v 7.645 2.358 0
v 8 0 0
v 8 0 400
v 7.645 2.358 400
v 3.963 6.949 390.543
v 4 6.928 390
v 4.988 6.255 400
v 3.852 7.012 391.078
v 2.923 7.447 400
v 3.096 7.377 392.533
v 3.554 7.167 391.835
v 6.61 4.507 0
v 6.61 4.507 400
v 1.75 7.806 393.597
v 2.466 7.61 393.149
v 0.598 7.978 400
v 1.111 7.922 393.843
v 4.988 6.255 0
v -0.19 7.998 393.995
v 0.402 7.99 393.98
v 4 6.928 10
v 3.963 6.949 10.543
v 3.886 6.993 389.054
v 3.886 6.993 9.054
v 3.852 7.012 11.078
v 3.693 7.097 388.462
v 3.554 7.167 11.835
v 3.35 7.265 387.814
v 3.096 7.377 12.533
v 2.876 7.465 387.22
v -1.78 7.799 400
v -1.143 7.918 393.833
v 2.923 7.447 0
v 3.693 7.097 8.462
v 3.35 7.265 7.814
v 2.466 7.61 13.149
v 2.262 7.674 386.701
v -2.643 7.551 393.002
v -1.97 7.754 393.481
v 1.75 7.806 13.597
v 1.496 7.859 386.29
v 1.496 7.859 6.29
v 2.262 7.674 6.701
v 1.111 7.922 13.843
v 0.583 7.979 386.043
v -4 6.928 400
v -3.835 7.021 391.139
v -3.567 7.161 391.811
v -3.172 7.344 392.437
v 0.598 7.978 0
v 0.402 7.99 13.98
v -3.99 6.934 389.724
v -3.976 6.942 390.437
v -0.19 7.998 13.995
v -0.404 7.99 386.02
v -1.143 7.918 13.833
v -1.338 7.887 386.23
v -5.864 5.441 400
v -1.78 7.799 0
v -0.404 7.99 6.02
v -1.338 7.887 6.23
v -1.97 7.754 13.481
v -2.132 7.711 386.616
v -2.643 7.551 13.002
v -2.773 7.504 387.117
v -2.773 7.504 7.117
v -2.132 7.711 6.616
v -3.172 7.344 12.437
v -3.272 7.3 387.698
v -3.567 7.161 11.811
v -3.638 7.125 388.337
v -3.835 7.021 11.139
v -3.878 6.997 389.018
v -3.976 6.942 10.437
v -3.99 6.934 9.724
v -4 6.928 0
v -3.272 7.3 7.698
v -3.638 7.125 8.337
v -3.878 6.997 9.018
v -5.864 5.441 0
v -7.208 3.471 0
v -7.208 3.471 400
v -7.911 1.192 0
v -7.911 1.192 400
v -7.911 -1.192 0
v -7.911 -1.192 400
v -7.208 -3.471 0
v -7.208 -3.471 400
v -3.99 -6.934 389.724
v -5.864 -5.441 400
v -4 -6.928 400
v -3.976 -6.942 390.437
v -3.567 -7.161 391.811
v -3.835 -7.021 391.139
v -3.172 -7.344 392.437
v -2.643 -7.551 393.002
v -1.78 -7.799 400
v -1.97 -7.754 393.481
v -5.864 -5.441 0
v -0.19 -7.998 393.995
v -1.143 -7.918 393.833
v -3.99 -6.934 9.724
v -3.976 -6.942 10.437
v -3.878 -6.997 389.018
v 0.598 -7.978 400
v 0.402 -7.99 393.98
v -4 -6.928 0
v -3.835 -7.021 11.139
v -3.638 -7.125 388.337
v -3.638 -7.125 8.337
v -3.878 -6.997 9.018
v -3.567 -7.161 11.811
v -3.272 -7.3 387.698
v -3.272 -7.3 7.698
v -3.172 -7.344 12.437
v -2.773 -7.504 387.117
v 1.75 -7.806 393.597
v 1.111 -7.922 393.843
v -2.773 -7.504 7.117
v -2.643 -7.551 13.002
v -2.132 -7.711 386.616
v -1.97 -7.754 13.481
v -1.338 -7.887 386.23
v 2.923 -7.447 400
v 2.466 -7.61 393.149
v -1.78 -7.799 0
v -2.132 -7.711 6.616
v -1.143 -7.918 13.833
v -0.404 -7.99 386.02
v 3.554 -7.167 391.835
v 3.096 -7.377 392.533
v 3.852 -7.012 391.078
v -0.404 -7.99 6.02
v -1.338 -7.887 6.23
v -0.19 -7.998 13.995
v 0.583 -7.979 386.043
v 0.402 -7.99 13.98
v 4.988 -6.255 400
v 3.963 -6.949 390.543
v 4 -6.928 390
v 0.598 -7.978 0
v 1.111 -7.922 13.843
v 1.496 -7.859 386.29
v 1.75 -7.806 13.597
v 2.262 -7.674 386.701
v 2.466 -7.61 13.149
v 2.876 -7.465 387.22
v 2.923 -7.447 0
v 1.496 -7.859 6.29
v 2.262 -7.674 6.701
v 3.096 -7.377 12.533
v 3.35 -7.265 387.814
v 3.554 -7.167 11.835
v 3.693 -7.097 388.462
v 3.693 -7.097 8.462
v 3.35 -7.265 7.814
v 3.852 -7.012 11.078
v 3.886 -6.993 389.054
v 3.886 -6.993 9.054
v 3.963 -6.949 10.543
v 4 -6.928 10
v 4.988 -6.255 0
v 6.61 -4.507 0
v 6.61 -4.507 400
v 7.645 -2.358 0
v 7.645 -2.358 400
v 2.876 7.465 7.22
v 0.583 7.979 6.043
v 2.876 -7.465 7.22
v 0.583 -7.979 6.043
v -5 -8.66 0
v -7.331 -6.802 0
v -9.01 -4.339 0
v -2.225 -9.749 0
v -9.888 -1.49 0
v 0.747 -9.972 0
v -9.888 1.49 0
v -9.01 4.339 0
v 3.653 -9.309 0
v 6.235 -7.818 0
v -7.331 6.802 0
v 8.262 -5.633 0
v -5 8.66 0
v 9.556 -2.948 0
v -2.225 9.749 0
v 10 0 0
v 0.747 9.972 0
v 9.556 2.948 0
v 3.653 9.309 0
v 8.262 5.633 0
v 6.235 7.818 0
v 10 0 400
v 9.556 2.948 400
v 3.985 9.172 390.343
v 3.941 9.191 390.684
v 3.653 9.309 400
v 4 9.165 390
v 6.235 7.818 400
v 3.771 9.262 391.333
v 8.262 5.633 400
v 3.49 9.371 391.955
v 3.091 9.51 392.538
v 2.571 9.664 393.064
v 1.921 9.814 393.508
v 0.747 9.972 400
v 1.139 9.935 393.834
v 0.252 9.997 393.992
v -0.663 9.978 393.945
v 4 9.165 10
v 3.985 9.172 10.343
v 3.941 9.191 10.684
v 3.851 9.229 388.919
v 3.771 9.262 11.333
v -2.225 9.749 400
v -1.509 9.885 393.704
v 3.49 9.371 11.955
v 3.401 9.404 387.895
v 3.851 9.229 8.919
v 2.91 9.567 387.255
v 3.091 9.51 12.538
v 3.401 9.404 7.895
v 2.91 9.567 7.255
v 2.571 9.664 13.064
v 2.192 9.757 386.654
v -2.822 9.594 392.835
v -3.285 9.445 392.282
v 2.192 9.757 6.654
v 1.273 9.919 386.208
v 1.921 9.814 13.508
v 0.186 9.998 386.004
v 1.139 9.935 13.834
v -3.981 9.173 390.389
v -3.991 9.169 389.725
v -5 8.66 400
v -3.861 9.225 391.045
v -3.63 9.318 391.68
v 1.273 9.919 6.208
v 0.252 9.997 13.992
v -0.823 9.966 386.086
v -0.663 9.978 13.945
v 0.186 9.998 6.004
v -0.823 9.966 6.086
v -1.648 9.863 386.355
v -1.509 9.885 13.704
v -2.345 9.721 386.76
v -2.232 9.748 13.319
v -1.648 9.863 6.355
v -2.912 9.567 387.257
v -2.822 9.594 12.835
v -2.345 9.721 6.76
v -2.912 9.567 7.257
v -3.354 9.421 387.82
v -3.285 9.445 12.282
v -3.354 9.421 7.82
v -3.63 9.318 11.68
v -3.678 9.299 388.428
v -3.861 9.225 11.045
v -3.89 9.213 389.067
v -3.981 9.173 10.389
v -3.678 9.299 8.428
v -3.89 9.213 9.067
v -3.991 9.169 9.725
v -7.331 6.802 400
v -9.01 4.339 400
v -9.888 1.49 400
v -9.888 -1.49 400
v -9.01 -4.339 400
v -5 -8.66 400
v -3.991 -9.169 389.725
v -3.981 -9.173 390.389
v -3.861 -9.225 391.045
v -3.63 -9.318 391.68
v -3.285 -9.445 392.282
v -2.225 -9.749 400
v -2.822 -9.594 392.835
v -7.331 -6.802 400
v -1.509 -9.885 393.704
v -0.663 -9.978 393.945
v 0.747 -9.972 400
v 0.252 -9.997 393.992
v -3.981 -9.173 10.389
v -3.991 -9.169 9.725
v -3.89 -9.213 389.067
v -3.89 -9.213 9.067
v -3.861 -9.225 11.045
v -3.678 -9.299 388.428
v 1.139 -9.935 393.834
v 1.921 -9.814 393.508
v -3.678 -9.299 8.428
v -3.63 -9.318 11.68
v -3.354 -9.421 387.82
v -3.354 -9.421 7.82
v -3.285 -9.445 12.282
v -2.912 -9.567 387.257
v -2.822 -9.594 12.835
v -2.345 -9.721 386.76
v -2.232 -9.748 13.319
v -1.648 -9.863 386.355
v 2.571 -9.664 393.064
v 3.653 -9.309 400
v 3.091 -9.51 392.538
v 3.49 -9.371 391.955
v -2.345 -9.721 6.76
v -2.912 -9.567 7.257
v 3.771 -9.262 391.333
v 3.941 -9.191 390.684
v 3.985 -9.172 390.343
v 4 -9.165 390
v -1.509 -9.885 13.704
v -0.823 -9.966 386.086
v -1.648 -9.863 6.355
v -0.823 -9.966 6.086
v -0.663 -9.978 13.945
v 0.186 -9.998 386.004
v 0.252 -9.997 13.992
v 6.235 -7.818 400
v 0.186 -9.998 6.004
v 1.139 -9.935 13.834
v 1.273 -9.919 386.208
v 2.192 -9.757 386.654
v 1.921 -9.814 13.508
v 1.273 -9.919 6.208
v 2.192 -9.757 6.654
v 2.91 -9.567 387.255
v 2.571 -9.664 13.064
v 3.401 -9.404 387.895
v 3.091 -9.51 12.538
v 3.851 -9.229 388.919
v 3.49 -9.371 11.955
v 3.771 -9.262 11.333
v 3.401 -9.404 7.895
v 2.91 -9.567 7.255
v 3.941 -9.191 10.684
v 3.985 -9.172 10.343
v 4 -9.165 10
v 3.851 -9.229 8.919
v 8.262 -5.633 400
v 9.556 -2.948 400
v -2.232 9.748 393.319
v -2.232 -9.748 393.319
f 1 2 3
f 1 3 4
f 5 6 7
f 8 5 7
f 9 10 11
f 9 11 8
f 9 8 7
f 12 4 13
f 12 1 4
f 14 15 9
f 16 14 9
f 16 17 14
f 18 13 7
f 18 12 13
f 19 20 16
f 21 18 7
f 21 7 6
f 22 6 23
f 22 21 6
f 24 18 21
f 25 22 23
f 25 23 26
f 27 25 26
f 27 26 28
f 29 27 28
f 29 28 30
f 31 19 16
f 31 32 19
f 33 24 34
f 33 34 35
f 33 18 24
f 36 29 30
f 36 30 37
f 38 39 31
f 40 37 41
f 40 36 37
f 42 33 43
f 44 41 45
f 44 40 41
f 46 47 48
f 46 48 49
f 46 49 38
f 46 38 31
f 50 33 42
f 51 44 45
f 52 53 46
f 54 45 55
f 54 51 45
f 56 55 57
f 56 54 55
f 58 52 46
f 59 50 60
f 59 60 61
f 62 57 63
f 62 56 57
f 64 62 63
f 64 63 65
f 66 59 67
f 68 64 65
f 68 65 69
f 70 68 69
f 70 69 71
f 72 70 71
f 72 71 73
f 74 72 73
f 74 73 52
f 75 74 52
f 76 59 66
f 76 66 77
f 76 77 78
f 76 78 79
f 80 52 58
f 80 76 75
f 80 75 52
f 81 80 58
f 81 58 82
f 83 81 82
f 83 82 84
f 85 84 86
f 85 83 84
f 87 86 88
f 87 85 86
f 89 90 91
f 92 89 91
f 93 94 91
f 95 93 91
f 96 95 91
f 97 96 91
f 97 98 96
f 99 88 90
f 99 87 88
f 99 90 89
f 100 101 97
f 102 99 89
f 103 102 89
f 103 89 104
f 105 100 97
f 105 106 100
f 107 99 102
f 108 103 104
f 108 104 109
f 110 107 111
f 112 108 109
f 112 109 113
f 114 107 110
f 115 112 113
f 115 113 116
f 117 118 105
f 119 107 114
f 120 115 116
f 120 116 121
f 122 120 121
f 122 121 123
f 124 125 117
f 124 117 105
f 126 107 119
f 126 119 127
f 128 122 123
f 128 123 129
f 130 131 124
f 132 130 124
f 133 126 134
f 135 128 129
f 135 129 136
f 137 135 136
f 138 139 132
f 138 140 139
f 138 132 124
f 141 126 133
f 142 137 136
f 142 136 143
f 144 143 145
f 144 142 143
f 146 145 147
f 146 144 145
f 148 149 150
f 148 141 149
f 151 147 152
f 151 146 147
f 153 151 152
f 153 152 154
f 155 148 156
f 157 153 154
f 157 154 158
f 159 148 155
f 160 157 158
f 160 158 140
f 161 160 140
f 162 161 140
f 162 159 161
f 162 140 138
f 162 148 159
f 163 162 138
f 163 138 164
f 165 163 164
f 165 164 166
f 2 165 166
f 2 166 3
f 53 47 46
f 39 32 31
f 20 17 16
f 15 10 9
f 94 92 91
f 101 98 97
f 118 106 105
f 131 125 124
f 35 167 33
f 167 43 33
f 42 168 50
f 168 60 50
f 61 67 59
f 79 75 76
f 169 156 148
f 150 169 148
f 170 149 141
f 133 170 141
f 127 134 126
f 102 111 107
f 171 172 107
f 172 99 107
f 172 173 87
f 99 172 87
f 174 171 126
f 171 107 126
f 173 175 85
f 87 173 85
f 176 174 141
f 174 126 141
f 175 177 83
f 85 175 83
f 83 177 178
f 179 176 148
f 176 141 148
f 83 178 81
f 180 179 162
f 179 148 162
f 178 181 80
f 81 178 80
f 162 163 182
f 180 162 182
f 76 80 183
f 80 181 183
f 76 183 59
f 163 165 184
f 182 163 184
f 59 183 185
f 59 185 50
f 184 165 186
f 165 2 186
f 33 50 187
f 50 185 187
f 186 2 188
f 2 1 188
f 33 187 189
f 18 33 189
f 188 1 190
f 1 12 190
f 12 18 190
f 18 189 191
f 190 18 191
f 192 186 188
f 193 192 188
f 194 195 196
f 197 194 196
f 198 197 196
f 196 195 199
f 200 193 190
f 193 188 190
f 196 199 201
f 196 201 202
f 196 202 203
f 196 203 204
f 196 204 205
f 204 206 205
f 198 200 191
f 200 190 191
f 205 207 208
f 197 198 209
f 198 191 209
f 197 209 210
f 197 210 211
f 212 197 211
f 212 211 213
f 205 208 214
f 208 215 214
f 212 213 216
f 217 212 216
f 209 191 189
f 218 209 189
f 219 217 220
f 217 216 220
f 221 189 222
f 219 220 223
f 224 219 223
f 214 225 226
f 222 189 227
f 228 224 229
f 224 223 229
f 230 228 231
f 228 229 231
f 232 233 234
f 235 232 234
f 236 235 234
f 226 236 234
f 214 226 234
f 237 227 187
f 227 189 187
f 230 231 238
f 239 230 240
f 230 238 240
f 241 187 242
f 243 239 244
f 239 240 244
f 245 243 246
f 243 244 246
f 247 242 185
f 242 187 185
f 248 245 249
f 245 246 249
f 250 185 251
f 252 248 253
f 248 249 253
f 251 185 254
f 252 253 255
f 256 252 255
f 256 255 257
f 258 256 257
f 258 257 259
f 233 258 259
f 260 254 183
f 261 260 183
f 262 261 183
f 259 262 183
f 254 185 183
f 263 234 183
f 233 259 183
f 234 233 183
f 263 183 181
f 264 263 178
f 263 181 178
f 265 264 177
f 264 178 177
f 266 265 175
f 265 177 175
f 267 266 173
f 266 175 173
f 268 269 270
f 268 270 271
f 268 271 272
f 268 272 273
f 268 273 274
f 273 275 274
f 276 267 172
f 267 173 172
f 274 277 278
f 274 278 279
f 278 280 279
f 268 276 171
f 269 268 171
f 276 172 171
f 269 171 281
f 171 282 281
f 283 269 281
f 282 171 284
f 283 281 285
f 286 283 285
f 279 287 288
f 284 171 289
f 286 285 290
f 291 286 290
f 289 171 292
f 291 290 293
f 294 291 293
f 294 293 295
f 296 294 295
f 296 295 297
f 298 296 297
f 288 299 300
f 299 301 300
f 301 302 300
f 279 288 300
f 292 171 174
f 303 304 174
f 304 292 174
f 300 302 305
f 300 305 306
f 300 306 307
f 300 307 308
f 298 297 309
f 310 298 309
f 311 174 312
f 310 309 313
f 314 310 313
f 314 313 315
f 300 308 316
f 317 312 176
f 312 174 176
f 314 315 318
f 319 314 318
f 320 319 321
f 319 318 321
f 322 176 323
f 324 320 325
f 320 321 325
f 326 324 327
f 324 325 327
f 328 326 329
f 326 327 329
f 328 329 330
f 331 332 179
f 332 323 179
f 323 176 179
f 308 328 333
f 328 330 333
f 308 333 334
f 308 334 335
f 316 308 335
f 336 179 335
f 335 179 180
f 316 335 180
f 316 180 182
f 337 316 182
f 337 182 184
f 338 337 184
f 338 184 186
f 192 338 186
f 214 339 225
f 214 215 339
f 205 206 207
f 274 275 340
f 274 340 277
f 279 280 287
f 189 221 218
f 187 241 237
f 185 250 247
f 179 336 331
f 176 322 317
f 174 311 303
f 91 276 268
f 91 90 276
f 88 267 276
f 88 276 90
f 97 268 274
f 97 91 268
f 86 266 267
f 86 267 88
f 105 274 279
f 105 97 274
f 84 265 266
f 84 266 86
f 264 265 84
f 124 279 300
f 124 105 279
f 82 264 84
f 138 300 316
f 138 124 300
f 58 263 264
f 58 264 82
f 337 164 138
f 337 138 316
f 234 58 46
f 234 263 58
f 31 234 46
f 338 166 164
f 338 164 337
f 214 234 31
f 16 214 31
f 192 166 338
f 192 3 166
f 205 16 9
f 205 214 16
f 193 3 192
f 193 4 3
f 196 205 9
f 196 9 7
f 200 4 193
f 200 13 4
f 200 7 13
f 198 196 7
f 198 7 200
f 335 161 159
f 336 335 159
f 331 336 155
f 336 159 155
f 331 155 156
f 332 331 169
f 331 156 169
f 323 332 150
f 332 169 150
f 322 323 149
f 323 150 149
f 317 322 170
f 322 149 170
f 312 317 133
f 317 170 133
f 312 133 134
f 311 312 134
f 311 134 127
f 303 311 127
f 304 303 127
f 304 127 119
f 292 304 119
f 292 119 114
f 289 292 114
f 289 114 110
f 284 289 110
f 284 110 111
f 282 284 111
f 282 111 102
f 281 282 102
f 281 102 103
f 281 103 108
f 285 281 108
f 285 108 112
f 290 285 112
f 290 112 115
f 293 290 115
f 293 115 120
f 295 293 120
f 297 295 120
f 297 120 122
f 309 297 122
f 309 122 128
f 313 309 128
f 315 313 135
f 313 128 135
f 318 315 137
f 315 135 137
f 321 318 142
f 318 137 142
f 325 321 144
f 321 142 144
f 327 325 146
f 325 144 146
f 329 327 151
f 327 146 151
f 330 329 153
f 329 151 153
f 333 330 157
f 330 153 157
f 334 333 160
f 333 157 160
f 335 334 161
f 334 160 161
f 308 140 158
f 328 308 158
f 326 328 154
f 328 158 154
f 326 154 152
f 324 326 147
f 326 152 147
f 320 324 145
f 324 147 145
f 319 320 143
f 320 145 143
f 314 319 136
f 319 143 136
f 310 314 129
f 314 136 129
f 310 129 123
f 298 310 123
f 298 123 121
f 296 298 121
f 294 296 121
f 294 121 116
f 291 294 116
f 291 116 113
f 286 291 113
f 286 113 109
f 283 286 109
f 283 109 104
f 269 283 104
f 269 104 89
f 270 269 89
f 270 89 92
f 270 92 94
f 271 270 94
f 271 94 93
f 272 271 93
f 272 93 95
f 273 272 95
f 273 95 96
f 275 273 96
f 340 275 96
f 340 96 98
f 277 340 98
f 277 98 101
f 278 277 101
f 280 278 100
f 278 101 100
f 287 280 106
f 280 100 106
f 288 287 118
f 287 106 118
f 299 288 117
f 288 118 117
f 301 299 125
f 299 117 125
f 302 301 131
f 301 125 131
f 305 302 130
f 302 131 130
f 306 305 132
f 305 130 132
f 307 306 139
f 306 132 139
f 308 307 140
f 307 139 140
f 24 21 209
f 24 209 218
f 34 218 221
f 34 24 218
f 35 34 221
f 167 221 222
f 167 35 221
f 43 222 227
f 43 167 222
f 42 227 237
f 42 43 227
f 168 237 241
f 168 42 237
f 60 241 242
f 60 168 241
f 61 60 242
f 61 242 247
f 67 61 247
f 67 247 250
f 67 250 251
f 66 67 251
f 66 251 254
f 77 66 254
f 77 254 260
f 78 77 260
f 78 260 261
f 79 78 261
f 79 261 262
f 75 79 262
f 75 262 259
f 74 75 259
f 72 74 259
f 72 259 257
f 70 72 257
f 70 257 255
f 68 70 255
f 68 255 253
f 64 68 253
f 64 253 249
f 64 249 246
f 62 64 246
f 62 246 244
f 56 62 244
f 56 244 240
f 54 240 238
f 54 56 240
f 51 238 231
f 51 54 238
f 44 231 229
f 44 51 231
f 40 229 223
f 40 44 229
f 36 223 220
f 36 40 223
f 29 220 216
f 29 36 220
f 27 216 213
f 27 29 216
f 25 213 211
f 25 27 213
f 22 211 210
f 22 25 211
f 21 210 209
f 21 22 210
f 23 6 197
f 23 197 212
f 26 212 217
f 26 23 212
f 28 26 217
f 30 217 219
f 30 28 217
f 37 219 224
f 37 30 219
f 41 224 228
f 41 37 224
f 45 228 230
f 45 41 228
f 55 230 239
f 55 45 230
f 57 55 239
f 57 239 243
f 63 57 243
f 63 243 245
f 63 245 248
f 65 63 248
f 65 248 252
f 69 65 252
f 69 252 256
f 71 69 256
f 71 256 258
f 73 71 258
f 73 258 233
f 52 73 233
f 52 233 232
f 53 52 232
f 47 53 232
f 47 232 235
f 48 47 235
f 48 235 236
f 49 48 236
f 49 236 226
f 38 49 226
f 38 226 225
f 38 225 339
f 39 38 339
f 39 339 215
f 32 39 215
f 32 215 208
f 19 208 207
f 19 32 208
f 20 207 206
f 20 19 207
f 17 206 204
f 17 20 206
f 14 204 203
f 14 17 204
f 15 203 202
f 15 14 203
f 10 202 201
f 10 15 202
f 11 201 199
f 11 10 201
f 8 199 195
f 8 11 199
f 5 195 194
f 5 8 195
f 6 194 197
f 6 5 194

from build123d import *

# Parameters (mm, degrees)
SKETCH_1_R               = 10
SKETCH_1_R_2             = 8
EXTRUDE_1_DEPTH          = 400
SKETCH_2_R               = 4
CUT_EXTRUDE_1_DEPTH      = 11
CUT_EXTRUDE_1_DEPTH_BACK = 11


with BuildPart() as part:
    # 草图1 → 凸台-拉伸1 (new body)
    with BuildSketch(Plane.XY):
        Circle(SKETCH_1_R)
        Circle(SKETCH_1_R_2, mode=Mode.SUBTRACT)
    extrude(amount=EXTRUDE_1_DEPTH)

    # 草图2 → 切除-拉伸1 (cut, two sides)
    with BuildSketch(Plane(origin=(0, 0, 0), x_dir=(1, 0, 0), z_dir=(0, 1, 0))) as cut_extrude_1_sk:
        with Locations((0, -10)):
            Circle(SKETCH_2_R)
        with Locations((0, -390)):
            Circle(SKETCH_2_R)
    extrude(amount=CUT_EXTRUDE_1_DEPTH, mode=Mode.SUBTRACT)
    extrude(cut_extrude_1_sk.sketch, amount=-CUT_EXTRUDE_1_DEPTH_BACK, mode=Mode.SUBTRACT)


solid = part.part
